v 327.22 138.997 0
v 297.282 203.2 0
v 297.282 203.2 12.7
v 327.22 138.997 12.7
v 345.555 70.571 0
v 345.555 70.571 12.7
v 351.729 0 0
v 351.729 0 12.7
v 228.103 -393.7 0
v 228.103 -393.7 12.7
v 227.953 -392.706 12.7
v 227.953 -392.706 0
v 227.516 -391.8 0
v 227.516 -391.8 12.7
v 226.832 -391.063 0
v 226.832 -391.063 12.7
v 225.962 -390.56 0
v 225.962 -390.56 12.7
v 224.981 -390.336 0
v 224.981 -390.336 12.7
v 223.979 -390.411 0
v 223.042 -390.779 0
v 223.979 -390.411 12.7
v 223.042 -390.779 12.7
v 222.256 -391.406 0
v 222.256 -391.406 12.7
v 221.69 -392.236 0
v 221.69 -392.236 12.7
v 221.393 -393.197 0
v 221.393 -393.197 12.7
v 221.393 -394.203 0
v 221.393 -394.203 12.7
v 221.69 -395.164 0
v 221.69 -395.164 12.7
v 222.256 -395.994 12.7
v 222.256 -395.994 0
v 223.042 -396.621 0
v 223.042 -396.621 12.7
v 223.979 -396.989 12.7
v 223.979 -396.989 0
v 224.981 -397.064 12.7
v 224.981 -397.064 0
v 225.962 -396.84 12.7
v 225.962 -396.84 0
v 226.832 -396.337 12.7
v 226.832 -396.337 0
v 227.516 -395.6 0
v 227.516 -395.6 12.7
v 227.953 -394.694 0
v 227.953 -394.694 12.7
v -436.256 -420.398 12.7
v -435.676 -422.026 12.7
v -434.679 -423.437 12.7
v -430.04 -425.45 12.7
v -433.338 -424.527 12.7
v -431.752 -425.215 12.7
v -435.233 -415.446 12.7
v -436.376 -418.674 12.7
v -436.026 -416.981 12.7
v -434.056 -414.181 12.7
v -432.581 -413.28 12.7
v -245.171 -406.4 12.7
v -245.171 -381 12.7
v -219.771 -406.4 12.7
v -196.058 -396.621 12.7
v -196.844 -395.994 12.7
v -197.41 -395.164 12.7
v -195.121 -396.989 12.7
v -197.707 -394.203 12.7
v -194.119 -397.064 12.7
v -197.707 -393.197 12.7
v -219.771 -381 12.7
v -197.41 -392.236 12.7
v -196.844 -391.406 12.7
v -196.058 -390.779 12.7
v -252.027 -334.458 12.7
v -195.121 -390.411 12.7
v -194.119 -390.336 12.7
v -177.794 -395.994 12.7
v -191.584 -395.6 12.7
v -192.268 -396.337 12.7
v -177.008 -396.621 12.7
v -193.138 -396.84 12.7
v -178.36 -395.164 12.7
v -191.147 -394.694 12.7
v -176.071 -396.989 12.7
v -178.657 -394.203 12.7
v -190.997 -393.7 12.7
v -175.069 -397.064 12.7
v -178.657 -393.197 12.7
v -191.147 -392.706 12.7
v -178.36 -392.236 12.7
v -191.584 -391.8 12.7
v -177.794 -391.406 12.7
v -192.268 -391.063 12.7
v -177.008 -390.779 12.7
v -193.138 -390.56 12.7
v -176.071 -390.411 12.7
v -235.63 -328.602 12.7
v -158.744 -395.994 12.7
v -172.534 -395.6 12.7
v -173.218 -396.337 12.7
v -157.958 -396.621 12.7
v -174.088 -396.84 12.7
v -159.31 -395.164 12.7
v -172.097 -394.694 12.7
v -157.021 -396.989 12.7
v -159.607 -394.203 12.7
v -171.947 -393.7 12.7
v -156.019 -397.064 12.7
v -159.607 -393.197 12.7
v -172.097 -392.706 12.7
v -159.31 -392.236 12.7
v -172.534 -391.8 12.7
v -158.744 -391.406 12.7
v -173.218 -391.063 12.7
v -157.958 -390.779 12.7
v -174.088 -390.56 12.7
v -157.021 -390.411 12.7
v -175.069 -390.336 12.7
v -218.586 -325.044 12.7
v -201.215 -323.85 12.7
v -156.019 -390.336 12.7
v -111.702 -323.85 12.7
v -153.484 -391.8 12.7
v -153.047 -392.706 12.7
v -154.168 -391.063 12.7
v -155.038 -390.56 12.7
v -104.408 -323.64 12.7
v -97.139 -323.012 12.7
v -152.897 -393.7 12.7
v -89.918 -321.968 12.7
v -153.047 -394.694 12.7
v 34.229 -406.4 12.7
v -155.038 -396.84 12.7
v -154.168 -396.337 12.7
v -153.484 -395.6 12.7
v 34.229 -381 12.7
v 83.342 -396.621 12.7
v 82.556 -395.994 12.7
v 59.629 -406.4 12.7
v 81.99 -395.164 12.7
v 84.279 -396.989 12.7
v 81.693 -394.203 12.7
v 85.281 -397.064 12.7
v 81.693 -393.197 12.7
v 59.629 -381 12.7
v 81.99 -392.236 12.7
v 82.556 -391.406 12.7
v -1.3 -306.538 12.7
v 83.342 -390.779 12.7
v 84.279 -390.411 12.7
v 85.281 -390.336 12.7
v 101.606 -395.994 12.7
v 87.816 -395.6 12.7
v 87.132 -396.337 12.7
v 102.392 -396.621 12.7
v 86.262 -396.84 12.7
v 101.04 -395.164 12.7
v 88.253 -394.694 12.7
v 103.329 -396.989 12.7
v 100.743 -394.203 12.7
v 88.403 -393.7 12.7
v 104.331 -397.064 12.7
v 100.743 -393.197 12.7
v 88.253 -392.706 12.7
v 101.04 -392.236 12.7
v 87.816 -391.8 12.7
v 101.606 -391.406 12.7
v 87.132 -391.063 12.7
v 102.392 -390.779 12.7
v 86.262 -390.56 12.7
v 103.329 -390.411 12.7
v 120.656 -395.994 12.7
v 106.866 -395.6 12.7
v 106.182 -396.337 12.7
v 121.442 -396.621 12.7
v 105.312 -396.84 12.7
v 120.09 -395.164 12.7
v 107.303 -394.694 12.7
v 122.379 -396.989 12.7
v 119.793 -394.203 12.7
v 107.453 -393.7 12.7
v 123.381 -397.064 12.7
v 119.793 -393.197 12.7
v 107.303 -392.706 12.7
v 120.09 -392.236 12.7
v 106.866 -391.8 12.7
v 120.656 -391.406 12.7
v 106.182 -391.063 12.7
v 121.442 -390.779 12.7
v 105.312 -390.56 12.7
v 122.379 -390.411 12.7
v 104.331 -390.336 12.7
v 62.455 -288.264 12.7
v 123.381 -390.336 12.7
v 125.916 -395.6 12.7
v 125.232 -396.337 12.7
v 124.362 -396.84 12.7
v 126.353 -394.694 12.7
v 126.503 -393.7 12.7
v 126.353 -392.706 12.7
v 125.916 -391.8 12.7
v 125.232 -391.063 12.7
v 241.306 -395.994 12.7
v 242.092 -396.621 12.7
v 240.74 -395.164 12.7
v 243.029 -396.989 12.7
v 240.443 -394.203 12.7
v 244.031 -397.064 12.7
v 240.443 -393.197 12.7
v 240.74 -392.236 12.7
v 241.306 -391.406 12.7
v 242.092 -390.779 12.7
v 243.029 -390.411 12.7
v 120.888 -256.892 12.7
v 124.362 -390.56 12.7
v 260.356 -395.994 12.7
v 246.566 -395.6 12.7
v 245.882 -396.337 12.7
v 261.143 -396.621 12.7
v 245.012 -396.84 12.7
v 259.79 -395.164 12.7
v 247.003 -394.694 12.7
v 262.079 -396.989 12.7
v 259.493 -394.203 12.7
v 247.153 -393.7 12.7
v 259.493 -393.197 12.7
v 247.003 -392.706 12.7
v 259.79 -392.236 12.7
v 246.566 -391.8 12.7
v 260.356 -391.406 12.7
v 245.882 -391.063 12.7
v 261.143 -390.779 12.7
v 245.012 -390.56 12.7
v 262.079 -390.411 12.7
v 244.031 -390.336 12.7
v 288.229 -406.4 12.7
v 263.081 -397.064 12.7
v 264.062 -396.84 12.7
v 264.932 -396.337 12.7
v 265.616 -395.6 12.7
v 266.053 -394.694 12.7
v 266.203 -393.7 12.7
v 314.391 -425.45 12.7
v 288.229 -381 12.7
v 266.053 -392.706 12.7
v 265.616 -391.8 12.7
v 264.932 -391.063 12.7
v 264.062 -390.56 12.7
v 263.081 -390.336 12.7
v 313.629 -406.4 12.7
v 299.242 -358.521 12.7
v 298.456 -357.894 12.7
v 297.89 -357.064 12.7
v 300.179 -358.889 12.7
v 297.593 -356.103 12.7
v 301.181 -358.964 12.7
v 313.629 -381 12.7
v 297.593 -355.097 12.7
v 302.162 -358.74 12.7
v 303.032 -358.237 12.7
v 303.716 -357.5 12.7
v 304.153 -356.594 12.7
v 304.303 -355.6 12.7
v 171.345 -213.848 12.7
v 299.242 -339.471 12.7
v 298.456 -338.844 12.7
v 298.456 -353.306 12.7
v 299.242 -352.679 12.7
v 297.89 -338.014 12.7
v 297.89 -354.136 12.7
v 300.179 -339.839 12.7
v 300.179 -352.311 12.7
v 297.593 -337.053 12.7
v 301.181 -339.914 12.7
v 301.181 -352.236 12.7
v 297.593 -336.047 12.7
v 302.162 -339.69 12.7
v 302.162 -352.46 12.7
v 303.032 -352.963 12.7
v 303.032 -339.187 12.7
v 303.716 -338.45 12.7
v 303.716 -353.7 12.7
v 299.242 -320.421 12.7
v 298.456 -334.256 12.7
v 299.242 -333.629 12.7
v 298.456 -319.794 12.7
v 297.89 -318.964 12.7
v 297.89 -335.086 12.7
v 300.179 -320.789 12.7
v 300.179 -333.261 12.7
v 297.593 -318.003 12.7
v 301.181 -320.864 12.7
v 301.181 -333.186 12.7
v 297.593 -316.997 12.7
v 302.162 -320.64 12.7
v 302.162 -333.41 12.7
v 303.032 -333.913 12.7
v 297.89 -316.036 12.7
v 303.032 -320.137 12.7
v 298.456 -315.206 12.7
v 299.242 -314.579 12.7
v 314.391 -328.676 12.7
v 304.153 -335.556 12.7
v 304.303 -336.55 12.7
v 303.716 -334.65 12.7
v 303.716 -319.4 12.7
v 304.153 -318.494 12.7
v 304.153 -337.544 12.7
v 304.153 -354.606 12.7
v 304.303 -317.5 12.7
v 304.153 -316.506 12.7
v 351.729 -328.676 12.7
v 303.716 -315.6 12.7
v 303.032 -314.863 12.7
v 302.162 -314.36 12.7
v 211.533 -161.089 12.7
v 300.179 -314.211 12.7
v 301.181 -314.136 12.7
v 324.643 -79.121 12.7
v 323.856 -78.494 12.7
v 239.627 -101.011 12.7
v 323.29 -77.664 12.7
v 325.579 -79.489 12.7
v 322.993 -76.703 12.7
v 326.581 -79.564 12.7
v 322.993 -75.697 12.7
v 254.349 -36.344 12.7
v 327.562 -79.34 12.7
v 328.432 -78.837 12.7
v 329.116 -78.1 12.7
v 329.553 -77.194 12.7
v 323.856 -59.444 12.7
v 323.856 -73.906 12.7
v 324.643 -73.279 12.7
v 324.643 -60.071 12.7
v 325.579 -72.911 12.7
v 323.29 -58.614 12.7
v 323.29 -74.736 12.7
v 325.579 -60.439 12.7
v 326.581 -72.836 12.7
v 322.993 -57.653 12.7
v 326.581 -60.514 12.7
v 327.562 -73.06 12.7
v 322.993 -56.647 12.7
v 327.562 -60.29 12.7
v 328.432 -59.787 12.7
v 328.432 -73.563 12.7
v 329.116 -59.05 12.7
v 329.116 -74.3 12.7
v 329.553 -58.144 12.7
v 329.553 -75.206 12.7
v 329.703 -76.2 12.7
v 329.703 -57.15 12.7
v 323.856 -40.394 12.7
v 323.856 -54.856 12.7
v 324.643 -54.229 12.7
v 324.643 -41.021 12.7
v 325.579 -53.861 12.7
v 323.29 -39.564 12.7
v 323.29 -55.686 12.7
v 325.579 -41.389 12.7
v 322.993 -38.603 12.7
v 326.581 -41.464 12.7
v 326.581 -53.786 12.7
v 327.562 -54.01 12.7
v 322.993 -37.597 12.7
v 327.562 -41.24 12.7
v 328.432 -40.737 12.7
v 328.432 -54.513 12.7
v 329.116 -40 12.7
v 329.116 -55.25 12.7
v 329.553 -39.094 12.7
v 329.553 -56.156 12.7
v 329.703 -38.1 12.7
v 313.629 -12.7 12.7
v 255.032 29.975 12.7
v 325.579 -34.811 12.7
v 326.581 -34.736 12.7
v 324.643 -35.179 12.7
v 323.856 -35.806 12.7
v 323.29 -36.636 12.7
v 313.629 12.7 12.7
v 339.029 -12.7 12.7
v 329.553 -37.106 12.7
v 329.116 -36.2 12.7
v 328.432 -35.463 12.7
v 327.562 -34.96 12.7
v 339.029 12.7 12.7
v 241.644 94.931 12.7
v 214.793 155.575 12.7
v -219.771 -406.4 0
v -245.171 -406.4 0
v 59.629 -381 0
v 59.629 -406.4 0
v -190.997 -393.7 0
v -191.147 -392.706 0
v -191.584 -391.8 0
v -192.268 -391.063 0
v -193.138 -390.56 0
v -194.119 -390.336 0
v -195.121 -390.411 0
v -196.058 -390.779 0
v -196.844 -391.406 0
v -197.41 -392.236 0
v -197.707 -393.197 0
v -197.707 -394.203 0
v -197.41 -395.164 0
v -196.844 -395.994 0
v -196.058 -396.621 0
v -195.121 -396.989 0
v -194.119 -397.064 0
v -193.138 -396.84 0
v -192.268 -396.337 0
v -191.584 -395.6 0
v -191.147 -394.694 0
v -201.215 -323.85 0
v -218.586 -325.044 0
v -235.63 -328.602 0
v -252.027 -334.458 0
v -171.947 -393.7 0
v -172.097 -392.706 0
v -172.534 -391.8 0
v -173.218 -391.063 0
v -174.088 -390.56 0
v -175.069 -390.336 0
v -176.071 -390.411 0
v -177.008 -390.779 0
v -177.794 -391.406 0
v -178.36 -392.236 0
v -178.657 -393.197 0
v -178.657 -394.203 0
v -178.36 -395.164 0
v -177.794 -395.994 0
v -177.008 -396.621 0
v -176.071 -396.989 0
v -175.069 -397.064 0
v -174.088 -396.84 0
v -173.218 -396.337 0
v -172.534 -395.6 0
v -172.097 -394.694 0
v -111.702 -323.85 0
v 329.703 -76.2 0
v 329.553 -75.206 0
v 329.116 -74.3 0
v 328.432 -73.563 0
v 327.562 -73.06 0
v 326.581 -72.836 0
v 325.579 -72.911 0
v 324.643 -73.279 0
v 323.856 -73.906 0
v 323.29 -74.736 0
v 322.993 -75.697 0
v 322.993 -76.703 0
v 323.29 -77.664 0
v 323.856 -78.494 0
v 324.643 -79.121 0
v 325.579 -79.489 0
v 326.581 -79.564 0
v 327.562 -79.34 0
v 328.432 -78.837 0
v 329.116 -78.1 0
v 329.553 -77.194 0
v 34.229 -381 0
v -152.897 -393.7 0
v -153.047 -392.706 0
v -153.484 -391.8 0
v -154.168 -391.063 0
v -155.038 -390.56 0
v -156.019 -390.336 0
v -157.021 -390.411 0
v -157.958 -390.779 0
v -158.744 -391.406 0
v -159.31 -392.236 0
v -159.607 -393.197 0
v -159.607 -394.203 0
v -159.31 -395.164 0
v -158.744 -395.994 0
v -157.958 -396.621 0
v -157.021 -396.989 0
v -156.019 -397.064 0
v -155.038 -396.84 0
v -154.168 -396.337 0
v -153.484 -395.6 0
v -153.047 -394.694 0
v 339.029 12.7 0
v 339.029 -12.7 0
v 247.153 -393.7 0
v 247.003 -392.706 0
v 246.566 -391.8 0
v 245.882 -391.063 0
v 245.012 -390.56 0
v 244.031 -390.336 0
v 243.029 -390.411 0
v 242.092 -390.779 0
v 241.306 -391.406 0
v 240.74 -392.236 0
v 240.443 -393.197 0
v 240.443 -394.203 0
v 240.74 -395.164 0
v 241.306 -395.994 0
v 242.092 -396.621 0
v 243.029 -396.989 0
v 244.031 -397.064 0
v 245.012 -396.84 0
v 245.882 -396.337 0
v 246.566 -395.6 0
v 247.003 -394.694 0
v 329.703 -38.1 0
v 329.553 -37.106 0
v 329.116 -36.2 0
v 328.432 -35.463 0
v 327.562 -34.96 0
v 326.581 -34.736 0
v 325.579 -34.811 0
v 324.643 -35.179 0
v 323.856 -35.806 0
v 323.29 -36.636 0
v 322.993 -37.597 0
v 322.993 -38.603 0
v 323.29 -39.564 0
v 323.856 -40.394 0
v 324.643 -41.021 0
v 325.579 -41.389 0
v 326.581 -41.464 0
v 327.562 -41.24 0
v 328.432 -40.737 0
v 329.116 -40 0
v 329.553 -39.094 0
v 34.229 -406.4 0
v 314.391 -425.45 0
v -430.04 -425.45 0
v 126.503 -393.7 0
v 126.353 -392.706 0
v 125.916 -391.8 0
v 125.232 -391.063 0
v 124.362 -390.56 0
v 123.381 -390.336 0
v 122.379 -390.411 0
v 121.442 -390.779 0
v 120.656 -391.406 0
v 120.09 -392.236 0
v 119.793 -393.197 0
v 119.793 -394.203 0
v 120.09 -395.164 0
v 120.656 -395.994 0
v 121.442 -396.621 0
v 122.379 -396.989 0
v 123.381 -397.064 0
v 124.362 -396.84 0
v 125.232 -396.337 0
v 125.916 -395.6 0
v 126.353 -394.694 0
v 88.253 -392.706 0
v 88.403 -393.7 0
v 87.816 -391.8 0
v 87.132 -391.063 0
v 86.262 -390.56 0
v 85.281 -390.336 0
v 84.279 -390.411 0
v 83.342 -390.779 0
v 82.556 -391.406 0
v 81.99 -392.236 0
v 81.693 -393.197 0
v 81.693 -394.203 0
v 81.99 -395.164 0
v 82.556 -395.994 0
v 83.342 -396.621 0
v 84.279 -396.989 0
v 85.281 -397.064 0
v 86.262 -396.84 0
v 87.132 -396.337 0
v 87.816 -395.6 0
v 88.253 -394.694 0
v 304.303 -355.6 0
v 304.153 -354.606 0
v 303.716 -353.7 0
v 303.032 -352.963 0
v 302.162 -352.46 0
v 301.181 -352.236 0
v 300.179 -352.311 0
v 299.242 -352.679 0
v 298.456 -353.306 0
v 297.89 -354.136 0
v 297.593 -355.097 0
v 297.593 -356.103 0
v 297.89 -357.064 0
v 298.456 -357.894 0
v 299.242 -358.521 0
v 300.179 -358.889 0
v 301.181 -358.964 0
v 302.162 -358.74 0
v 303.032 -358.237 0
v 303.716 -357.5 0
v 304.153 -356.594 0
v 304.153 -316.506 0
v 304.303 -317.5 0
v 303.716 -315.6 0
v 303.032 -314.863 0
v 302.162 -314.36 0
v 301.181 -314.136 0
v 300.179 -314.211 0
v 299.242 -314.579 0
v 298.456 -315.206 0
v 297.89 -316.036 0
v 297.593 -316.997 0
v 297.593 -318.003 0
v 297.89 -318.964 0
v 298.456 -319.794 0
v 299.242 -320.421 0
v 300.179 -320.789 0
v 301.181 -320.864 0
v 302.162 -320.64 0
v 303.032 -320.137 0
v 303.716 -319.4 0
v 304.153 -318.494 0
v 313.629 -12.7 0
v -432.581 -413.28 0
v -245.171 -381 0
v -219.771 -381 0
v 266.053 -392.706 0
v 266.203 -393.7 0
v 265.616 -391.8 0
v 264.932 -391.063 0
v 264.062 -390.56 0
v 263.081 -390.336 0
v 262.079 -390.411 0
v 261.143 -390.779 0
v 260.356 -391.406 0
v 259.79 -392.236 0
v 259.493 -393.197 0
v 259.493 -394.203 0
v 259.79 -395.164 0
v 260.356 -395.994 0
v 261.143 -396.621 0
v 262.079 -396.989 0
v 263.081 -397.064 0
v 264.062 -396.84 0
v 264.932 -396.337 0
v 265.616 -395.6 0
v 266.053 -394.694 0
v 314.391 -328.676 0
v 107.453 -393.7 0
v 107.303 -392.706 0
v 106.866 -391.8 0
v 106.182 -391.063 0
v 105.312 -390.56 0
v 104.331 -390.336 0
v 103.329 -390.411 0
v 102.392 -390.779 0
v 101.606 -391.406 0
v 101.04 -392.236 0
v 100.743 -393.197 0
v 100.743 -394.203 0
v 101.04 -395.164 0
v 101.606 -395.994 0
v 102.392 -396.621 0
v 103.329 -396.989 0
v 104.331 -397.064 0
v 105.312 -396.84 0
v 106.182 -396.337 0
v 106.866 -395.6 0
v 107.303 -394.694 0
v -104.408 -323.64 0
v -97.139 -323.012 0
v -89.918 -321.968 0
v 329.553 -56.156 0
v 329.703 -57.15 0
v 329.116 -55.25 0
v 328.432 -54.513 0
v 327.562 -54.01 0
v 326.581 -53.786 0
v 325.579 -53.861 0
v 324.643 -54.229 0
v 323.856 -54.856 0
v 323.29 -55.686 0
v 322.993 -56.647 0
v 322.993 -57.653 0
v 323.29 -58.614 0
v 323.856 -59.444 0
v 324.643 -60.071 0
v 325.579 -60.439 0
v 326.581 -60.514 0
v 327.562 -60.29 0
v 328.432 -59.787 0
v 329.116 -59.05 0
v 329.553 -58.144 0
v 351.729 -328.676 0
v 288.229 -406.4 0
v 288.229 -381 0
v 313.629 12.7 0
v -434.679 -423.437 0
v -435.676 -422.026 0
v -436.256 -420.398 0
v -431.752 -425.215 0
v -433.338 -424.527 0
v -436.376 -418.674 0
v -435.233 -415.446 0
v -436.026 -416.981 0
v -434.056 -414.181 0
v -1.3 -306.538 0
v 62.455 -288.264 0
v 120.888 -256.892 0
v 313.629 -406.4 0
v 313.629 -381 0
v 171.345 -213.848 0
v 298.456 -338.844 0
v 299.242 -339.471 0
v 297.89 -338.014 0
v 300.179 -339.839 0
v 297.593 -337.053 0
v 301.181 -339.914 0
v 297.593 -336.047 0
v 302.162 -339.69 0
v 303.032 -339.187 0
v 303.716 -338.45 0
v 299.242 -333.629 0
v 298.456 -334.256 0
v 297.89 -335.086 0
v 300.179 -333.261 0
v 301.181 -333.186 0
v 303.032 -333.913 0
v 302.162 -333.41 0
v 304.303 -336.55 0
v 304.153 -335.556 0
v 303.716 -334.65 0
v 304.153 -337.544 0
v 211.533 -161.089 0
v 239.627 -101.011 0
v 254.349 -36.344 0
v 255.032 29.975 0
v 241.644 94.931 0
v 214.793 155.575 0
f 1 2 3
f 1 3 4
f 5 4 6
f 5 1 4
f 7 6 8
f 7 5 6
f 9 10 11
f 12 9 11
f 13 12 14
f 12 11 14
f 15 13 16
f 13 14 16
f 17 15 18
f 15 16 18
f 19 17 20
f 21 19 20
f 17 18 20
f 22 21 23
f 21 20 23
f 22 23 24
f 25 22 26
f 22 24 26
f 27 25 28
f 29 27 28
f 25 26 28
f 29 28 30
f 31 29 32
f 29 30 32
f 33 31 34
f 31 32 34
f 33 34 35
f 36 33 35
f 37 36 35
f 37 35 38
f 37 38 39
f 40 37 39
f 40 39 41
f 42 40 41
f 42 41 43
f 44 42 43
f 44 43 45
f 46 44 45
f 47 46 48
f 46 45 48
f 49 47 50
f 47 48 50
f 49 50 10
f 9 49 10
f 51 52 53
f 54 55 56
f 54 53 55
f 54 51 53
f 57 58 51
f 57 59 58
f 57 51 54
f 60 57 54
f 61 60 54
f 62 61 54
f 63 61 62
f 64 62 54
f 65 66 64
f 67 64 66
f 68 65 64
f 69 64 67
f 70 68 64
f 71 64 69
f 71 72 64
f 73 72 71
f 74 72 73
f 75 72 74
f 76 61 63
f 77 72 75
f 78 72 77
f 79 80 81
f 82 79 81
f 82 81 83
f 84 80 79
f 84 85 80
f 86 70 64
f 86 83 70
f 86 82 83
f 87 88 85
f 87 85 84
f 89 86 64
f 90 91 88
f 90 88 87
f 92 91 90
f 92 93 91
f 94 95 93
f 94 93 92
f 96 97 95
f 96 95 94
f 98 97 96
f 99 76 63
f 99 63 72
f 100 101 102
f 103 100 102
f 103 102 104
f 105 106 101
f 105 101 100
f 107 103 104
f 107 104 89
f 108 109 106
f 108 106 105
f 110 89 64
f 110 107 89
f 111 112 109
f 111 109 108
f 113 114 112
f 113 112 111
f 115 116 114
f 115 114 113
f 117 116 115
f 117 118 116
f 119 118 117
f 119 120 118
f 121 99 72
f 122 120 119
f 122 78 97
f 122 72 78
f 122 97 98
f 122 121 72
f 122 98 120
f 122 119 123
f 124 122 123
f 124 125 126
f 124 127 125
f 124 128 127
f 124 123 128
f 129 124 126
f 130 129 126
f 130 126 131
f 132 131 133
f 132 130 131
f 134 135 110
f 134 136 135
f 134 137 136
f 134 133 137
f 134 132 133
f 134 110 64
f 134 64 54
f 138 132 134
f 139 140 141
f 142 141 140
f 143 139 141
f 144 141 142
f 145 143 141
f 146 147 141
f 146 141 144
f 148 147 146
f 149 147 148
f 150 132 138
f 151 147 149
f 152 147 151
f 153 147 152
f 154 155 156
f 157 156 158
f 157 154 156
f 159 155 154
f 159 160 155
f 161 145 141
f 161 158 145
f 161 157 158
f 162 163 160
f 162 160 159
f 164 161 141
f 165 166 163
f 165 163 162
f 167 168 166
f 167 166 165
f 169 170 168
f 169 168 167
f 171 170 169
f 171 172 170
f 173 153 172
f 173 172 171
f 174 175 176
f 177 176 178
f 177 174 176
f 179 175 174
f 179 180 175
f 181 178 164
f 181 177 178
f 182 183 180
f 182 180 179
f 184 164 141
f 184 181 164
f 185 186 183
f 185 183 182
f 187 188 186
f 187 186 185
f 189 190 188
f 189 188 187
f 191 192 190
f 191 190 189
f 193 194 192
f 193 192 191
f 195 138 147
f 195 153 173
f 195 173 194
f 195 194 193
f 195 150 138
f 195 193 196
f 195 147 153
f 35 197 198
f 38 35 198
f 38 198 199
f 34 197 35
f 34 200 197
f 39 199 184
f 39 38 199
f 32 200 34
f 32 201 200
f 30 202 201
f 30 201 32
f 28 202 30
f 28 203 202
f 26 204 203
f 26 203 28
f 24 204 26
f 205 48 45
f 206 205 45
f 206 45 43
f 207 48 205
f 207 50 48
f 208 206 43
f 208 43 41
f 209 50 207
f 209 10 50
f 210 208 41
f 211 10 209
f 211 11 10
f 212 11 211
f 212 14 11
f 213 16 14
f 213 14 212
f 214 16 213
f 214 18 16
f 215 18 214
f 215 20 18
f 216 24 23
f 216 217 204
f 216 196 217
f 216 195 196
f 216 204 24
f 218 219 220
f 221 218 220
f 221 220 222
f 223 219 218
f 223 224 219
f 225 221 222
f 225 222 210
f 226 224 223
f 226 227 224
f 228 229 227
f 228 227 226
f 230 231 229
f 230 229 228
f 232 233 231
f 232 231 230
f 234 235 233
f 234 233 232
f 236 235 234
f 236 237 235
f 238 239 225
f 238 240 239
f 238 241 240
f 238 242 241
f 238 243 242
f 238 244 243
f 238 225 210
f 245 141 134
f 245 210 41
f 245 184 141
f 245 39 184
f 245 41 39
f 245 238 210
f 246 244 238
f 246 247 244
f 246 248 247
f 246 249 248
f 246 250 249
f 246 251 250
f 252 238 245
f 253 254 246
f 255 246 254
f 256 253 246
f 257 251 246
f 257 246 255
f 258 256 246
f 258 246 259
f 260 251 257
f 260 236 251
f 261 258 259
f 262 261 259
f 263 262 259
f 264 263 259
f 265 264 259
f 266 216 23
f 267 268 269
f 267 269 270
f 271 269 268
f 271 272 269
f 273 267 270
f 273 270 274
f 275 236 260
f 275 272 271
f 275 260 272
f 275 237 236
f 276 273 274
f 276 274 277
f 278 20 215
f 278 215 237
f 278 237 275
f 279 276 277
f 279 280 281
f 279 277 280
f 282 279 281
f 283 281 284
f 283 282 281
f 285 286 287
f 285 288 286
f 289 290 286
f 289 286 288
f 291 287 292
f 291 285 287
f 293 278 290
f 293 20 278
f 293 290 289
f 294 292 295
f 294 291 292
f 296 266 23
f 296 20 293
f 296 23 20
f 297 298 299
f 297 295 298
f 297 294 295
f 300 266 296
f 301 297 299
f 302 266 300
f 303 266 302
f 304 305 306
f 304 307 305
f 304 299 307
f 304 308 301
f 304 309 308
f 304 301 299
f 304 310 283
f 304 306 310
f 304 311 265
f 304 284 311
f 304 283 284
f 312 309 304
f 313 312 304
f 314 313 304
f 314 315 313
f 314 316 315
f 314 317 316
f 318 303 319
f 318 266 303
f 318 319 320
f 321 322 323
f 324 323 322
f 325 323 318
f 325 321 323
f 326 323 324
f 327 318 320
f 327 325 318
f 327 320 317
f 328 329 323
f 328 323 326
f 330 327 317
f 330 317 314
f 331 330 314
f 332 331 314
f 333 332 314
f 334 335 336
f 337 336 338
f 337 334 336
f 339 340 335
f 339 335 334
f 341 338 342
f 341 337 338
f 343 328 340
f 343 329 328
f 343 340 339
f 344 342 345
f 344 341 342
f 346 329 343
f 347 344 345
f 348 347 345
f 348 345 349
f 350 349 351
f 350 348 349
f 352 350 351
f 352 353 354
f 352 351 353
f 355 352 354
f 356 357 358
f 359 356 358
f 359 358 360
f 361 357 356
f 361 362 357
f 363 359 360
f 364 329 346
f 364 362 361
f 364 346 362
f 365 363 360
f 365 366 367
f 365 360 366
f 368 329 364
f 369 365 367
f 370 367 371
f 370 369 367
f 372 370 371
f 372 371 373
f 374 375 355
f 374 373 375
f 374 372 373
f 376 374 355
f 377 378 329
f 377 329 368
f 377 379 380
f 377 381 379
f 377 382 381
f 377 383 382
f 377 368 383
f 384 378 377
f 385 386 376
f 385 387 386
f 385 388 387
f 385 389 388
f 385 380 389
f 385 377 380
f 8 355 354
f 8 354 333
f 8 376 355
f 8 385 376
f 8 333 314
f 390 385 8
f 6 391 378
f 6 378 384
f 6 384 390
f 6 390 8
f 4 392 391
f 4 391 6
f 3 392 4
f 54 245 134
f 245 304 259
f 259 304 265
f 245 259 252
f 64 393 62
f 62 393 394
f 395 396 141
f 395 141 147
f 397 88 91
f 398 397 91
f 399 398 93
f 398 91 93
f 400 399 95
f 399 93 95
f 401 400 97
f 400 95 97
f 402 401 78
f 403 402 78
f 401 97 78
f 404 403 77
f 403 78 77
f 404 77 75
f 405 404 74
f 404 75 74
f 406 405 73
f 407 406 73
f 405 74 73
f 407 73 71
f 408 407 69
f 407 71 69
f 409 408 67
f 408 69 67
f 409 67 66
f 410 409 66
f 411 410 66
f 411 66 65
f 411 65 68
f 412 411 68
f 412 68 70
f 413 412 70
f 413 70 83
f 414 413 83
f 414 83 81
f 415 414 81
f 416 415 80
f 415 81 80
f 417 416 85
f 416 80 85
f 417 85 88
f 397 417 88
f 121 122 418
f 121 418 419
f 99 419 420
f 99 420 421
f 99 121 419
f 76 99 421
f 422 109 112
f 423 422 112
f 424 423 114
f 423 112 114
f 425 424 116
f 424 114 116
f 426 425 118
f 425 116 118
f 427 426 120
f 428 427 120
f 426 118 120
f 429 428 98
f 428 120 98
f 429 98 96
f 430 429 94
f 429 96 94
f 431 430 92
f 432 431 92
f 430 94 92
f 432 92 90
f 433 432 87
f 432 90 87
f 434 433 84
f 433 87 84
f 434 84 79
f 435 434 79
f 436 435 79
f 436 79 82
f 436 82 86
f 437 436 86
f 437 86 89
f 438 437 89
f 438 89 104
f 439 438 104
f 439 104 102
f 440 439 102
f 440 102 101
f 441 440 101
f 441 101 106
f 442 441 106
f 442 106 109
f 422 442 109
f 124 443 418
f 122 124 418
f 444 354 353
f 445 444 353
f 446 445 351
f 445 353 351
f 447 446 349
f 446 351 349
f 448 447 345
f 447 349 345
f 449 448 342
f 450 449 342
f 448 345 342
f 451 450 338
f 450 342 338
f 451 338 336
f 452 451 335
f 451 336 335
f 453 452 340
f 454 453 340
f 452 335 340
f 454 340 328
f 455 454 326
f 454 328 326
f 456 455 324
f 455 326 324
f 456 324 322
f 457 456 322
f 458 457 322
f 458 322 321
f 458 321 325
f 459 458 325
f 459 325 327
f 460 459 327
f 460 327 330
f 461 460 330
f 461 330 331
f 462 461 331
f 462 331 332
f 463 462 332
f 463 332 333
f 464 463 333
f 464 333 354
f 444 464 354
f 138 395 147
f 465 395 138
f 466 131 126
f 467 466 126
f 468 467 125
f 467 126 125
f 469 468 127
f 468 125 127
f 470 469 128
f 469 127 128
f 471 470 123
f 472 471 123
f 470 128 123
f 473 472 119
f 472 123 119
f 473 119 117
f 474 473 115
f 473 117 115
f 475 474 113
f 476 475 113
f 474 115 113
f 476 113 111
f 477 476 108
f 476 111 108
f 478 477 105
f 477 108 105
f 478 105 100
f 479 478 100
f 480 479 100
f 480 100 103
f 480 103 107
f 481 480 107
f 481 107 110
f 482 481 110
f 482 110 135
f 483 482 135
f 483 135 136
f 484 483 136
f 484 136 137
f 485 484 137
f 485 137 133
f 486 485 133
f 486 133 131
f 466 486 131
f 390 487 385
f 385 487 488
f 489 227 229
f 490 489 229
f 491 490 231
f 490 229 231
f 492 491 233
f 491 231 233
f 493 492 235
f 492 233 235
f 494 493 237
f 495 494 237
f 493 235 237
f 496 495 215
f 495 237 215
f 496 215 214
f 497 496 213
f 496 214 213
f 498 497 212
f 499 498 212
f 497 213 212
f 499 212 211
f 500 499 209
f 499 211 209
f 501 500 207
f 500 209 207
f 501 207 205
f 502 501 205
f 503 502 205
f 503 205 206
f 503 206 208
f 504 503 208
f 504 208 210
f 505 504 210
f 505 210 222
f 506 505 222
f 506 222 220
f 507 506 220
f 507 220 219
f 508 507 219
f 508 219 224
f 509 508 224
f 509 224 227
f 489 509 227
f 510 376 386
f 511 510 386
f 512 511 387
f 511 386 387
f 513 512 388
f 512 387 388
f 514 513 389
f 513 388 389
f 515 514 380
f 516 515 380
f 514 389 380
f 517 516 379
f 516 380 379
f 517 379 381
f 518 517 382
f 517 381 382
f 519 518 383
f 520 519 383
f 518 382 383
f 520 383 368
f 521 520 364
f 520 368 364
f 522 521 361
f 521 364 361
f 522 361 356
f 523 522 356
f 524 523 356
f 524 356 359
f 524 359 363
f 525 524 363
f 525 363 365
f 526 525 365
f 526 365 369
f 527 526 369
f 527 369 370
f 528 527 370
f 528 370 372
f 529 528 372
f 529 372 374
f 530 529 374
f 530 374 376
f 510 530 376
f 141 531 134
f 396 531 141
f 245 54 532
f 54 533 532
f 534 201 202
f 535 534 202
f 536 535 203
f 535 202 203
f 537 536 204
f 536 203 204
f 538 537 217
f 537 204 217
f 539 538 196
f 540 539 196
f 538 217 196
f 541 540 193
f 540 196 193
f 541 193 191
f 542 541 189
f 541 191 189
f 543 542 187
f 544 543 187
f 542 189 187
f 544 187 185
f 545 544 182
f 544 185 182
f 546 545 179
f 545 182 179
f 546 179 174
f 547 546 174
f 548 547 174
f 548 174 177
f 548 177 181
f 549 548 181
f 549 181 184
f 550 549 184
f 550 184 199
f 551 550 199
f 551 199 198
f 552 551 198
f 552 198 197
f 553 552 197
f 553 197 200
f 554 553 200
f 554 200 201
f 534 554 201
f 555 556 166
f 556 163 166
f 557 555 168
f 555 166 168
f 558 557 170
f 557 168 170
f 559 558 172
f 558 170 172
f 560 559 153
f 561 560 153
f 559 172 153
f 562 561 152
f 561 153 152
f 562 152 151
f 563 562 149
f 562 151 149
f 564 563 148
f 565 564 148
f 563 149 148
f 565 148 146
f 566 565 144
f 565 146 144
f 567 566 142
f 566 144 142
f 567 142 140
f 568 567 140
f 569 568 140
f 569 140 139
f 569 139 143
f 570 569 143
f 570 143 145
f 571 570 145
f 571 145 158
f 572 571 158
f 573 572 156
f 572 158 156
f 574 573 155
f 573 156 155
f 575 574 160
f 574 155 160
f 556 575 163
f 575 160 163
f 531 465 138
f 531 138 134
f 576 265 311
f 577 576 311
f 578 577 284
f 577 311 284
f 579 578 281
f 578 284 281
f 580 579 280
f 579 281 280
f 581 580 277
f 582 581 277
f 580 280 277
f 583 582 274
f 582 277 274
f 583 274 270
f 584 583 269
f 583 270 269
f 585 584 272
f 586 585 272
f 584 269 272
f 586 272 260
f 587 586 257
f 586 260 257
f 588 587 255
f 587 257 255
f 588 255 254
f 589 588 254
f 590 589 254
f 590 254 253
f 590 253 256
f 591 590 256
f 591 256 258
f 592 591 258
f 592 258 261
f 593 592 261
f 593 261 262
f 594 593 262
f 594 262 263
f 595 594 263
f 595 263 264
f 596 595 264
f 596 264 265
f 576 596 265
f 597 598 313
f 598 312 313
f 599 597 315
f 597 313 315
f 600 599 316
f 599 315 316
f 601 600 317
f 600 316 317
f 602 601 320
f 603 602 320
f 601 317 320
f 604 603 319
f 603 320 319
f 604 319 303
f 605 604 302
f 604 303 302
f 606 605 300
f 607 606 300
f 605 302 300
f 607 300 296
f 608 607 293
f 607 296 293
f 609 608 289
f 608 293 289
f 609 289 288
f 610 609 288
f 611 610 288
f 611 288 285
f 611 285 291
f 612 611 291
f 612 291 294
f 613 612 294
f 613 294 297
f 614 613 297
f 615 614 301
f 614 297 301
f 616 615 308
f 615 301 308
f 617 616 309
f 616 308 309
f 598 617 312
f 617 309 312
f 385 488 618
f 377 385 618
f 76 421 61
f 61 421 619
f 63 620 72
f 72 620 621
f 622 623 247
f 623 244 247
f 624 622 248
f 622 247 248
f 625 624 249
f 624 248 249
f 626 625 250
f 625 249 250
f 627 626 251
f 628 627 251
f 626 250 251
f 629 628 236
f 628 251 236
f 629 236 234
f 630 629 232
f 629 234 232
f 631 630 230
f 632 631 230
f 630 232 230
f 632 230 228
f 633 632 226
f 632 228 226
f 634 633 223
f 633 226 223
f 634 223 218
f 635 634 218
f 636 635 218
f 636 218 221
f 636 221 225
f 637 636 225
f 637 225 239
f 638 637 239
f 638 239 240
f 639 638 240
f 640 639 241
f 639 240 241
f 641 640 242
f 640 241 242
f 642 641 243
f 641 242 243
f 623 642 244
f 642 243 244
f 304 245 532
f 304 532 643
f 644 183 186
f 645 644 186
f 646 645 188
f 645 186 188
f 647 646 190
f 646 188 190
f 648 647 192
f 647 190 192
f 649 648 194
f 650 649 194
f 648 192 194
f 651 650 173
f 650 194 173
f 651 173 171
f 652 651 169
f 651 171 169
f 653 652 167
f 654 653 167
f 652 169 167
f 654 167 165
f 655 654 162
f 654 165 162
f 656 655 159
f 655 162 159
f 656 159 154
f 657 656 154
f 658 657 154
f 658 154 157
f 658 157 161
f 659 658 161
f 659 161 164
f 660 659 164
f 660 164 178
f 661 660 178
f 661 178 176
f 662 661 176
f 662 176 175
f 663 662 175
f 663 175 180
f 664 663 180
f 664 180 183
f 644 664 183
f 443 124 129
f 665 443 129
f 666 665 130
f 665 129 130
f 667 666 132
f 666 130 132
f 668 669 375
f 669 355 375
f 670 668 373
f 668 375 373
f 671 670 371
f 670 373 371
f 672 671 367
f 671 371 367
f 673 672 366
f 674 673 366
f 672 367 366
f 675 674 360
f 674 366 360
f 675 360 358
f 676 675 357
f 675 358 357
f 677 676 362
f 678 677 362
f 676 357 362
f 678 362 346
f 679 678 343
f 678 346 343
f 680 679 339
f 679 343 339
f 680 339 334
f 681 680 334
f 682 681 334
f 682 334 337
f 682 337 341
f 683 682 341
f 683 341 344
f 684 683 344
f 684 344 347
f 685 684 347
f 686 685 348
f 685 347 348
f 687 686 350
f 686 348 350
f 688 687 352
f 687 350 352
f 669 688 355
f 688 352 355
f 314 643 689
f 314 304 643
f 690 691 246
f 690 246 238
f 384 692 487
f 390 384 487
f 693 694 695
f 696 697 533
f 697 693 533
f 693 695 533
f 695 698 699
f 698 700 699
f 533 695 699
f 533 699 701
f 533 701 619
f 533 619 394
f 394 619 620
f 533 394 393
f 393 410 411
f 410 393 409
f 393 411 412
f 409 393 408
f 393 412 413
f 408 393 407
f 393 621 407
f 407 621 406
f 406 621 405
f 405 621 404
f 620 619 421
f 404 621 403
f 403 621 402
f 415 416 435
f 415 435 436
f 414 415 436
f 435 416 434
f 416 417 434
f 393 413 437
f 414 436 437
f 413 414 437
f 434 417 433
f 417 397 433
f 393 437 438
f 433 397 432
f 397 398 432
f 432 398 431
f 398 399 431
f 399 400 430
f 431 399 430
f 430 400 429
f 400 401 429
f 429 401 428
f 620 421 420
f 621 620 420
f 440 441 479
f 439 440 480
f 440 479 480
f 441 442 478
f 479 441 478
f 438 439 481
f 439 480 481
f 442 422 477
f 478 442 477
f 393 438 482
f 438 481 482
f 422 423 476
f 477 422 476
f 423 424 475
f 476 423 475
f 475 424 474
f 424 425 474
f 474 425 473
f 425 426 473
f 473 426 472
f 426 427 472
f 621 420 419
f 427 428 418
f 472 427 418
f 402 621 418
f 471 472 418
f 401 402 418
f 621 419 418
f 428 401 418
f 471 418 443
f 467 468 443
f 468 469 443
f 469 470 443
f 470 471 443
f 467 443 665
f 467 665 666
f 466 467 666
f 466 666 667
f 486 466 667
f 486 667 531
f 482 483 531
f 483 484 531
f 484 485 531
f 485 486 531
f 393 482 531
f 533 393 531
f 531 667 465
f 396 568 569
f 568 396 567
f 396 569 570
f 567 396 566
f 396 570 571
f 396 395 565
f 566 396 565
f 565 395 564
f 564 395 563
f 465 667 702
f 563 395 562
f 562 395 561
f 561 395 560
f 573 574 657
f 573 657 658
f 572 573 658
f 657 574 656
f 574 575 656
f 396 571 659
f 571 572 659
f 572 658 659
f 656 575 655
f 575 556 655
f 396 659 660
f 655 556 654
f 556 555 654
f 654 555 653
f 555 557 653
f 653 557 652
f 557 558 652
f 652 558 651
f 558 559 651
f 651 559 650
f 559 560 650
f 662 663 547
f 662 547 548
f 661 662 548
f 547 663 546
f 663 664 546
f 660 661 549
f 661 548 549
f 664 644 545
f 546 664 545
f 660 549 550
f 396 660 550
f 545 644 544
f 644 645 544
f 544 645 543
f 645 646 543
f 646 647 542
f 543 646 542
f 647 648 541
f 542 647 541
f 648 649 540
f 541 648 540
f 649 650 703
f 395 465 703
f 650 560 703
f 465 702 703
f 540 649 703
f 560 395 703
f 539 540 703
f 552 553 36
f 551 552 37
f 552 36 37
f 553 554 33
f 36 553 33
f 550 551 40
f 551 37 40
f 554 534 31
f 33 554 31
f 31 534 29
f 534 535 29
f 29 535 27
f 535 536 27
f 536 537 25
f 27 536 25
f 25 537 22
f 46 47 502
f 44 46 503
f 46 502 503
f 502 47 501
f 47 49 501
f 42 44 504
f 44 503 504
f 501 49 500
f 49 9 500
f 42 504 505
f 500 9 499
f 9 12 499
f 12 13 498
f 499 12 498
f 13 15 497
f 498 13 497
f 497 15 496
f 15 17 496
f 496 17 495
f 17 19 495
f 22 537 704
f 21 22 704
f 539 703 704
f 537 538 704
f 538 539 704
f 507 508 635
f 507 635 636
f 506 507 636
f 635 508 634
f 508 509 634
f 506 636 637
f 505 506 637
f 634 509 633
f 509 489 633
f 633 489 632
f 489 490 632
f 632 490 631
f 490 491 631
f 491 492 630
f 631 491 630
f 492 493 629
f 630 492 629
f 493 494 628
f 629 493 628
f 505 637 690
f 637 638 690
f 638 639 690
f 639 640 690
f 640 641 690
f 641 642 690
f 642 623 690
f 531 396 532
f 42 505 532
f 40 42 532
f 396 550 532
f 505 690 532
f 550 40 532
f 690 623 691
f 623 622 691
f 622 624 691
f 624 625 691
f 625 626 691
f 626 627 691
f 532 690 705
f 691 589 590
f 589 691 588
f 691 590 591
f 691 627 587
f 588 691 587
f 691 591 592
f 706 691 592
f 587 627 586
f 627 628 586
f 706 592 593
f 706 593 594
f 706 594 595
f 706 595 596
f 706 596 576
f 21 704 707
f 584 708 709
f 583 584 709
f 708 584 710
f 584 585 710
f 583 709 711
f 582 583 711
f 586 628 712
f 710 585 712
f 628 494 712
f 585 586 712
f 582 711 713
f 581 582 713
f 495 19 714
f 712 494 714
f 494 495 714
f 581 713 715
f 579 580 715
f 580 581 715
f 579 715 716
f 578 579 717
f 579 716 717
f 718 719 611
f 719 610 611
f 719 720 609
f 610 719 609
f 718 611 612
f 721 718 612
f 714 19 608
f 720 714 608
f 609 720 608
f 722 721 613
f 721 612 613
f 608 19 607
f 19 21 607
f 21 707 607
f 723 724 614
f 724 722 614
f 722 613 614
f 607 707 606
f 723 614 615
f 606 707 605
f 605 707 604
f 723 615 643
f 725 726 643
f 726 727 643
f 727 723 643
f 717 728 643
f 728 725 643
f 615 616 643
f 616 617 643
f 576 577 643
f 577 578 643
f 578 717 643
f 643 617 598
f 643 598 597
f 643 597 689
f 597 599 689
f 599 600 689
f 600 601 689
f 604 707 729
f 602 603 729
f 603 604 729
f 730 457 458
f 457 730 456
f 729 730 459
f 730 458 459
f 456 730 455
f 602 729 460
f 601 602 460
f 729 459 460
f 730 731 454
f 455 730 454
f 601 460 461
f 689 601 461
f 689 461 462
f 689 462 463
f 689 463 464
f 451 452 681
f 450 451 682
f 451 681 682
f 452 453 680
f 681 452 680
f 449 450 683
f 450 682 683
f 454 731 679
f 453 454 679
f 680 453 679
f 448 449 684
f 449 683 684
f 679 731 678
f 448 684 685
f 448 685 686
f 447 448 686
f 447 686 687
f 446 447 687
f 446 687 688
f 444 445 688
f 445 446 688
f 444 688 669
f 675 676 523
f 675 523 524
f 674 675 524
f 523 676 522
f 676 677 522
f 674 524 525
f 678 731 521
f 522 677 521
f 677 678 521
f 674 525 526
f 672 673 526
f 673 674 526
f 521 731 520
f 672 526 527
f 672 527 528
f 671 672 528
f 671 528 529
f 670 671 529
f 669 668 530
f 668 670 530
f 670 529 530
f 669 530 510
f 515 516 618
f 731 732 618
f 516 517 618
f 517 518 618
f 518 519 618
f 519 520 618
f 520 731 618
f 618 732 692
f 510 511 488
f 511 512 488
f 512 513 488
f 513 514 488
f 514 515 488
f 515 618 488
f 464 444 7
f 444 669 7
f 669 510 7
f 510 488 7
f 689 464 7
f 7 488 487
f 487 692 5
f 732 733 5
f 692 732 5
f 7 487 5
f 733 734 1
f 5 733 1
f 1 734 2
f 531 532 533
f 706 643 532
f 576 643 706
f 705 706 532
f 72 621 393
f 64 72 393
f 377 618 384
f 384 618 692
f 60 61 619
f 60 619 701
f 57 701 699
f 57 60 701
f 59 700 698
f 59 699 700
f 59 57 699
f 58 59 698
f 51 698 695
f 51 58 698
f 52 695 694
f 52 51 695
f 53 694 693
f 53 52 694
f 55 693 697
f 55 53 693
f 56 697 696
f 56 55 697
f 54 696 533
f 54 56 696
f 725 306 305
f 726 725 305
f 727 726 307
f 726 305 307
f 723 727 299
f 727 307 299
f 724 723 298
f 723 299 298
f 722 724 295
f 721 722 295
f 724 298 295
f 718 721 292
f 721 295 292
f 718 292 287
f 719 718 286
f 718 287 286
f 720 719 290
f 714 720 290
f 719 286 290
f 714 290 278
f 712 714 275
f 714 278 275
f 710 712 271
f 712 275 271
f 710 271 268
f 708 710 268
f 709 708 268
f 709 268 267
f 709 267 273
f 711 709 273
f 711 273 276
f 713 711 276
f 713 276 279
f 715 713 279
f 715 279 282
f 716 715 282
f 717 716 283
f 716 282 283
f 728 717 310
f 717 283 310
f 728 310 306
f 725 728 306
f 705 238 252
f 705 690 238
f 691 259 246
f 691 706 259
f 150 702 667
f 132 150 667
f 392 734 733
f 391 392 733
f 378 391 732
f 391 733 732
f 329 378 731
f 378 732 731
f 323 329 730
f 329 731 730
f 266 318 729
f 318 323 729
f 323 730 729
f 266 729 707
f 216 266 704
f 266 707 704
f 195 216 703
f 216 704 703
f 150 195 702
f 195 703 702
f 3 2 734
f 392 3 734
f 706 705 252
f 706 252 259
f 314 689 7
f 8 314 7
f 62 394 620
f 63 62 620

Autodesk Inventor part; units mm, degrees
ref_plane "YZ Plane" through (0, 0, 0) normal (1, 0, 0) x (0, 1, 0)
ref_plane "XZ Plane" through (0, 0, 0) normal (0, 1, 0) x (-1, 0, 0)
ref_plane "XY Plane" through (0, 0, 0) normal (0, 0, 1) x (1, 0, 0)
sketch "Sketch1" plane through (0, 0, 0) normal (0, 0, 1) x (1, 0, 0)
  arc A0 (214.793, 155.575) -> (-1.2995, -306.5385) centre (-54.6708, 0) ccw
  line L0 (-1.2995, -306.5385) -> (-100.7285, -323.85)
  line L1 (-189.1562, -406.4) -> (313.6292, -406.4)
  line L2 (351.7292, -406.4) -> (351.7292, 0)
  arc A1 (-1.2995, -306.5385) -> (214.793, 155.575) centre (-54.6708, 0) ccw
  line L3 (-54.6708, 0) -> (401.7178, 0) construction
  arc A2 (351.7292, 0) -> (297.2819, 203.2) centre (-54.6708, 0) ccw
  line L4 (297.2819, 203.2) -> (214.793, 155.575)
  line L5 (34.2292, -406.4) -> (59.6292, -406.4)
  line L6 (59.6292, -406.4) -> (59.6292, -381)
  line L7 (59.6292, -381) -> (34.2292, -381)
  line L8 (34.2292, -381) -> (34.2292, -406.4)
  line L9 (288.2292, -406.4) -> (351.7292, -406.4)
  line L10 (313.6292, -406.4) -> (313.6292, -381)
  line L11 (313.6292, -381) -> (288.2292, -381)
  line L12 (288.2292, -381) -> (288.2292, -406.4)
  circle A3 centre (-54.6708, 0) radius 200.5558 construction
  line L13 (313.6292, 12.7) -> (339.0292, 12.7)
  line L14 (339.0292, 12.7) -> (339.0292, -12.7)
  line L15 (339.0292, -12.7) -> (313.6292, -12.7)
  line L16 (313.6292, -12.7) -> (313.6292, 12.7)
  line L17 (313.6292, 12.7) -> (339.0292, -12.7) construction
  line L18 (339.0292, 12.7) -> (313.6292, -12.7) construction
  line L19 (-189.1562, -406.4) -> (-358.8569, -425.45)
  line L20 (-358.8569, -425.45) -> (351.7292, -425.45)
  line L21 (351.7292, -425.45) -> (351.7292, -406.4)
  line L22 (313.6292, -406.4) -> (351.7292, -406.4)
  line L23 (-358.8569, -425.45) -> (-100.7285, -323.85)
  line L24 (-100.7285, -323.85) -> (-227.7285, -323.85)
  line L25 (-227.7285, -323.85) -> (-460.4569, -425.45)
  line L26 (-460.4569, -425.45) -> (-358.8569, -425.45)
  line L27 (-245.1708, -381) -> (-219.7708, -381)
  line L28 (-219.7708, -381) -> (-219.7708, -406.4)
  line L29 (-219.7708, -406.4) -> (-245.1708, -406.4)
  line L30 (-245.1708, -406.4) -> (-245.1708, -381)
  line L31 (-100.7285, -323.85) -> (-189.1562, -406.4)
  point P0 (290.2482, -355.6)
  point P1 (326.3292, 0)
  point P2 (326.3292, 0)
  point P3 (302.9482, -330.2)
  point P4 (298.4754, -355.6)
  point P5 (302.9482, -12.7)
  point P6 (302.7291, 12.7)
  point P7 (-245.1708, -386.8886)
  point P8 (-227.8836, -381)
  dimension "d0" = 622.3
  dimension "d1" = 406.4
  dimension "d2" = 30
  dimension "d4" = 406.4
  dimension "d7" = 25.4
  dimension "d8" = 25.4
  dimension "d9" = 38.1
  dimension "d10" = 292.1
  dimension "d21" = 25.4
  dimension "d22" = 25.4
  dimension "d23" = 25.4
  dimension "d27" = 19.05
  dimension "d32" = 101.6
  dimension "d33" = 101.6
  dimension "d40" = 254
  dimension "d41" = 127
extrude "Extrusion1" add sketch "Sketch1" along normal blind 12.7 contours L4 A2 L2 L9 L10 L11 L12 L1 L6 L7 L8 L31 L0 A1 | L31 L19 L23 | L23 L26 L25 L24 | L19 L1 L9 L21 L20
ref_plane "Work Plane1" through (59.6292, 0, 0) normal (0, 1, 0) x (-1, 0, 0)
fillet "Fillet3" radius 127 2 edges at (-100.7285, -323.85, 6.35) (-227.7285, -323.85, 6.35)
fillet "Fillet3" radius 6.35 1 edges at (-460.4569, -425.45, 6.35)
sketch "Sketch3" plane through (59.6292, 0, 0) normal (0, 1, 0) x (-1, 0, 0)
  line L0 (314.8558, -44.45) -> (-86.2558, -44.45) construction
  line L1 (114.3, -44.45) -> (114.3, -0.9544) construction
  circle A0 centre (355.6, -69.85) radius 88.9
  point P0 (59.6292, 0)
  dimension "d17" = 25.4
  dimension "d18" = 177.8
  dimension "d19" = 241.3
revolve "Revolution2" cut sketch "Sketch3" angle 360 about axis through (-54.6708, 0, -44.45) along (0, 0, 1)
sketch "Sketch4" plane through (0, 0, 12.7) normal (0, 0, 1) x (1, 0, 0)
  circle A0 centre (85.0292, -393.7) radius 3.3734 projected
  circle A1 centre (104.0792, -393.7) radius 3.3734 projected
  circle A2 centre (123.1292, -393.7) radius 3.3734 projected
  circle A3 centre (224.7292, -393.7) radius 3.3734 projected
  circle A4 centre (243.7792, -393.7) radius 3.3734 projected
  circle A5 centre (262.8292, -393.7) radius 3.3734 projected
  circle A6 centre (300.9292, -355.6) radius 3.3734 projected
  circle A7 centre (300.9292, -336.55) radius 3.3734 projected
  circle A8 centre (300.9292, -317.5) radius 3.3734 projected
  circle A9 centre (326.3292, -76.2) radius 3.3734 projected
  circle A10 centre (326.3292, -57.15) radius 3.3734 projected
  circle A11 centre (326.3292, -38.1) radius 3.3734 projected
  circle A12 centre (-156.2708, -393.7) radius 3.3734 projected
  circle A13 centre (-175.3208, -393.7) radius 3.3734 projected
  circle A14 centre (-194.3708, -393.7) radius 3.3734 projected
  point P0 (0, 0)
extrude "Extrusion2" cut sketch "Sketch4" against normal through all
sketch "Sketch5" plane through (0, 0, 12.7) normal (0, 0, 1) x (1, 0, 0)
  line L0 (351.7292, -425.45) -> (314.3912, -425.45)
  line L1 (314.3912, -425.45) -> (314.3912, -328.676)
  line L2 (314.3912, -328.676) -> (351.7292, -328.676)
  line L3 (351.7292, -328.676) -> (351.7292, -425.45)
  line L4 (314.3912, -331.851) -> (314.3912, -328.676) projected
  point P0 (0, 0)
extrude "Extrusion3" cut sketch "Sketch5" against normal through all
properties part number "OuterWheelIndexer"
